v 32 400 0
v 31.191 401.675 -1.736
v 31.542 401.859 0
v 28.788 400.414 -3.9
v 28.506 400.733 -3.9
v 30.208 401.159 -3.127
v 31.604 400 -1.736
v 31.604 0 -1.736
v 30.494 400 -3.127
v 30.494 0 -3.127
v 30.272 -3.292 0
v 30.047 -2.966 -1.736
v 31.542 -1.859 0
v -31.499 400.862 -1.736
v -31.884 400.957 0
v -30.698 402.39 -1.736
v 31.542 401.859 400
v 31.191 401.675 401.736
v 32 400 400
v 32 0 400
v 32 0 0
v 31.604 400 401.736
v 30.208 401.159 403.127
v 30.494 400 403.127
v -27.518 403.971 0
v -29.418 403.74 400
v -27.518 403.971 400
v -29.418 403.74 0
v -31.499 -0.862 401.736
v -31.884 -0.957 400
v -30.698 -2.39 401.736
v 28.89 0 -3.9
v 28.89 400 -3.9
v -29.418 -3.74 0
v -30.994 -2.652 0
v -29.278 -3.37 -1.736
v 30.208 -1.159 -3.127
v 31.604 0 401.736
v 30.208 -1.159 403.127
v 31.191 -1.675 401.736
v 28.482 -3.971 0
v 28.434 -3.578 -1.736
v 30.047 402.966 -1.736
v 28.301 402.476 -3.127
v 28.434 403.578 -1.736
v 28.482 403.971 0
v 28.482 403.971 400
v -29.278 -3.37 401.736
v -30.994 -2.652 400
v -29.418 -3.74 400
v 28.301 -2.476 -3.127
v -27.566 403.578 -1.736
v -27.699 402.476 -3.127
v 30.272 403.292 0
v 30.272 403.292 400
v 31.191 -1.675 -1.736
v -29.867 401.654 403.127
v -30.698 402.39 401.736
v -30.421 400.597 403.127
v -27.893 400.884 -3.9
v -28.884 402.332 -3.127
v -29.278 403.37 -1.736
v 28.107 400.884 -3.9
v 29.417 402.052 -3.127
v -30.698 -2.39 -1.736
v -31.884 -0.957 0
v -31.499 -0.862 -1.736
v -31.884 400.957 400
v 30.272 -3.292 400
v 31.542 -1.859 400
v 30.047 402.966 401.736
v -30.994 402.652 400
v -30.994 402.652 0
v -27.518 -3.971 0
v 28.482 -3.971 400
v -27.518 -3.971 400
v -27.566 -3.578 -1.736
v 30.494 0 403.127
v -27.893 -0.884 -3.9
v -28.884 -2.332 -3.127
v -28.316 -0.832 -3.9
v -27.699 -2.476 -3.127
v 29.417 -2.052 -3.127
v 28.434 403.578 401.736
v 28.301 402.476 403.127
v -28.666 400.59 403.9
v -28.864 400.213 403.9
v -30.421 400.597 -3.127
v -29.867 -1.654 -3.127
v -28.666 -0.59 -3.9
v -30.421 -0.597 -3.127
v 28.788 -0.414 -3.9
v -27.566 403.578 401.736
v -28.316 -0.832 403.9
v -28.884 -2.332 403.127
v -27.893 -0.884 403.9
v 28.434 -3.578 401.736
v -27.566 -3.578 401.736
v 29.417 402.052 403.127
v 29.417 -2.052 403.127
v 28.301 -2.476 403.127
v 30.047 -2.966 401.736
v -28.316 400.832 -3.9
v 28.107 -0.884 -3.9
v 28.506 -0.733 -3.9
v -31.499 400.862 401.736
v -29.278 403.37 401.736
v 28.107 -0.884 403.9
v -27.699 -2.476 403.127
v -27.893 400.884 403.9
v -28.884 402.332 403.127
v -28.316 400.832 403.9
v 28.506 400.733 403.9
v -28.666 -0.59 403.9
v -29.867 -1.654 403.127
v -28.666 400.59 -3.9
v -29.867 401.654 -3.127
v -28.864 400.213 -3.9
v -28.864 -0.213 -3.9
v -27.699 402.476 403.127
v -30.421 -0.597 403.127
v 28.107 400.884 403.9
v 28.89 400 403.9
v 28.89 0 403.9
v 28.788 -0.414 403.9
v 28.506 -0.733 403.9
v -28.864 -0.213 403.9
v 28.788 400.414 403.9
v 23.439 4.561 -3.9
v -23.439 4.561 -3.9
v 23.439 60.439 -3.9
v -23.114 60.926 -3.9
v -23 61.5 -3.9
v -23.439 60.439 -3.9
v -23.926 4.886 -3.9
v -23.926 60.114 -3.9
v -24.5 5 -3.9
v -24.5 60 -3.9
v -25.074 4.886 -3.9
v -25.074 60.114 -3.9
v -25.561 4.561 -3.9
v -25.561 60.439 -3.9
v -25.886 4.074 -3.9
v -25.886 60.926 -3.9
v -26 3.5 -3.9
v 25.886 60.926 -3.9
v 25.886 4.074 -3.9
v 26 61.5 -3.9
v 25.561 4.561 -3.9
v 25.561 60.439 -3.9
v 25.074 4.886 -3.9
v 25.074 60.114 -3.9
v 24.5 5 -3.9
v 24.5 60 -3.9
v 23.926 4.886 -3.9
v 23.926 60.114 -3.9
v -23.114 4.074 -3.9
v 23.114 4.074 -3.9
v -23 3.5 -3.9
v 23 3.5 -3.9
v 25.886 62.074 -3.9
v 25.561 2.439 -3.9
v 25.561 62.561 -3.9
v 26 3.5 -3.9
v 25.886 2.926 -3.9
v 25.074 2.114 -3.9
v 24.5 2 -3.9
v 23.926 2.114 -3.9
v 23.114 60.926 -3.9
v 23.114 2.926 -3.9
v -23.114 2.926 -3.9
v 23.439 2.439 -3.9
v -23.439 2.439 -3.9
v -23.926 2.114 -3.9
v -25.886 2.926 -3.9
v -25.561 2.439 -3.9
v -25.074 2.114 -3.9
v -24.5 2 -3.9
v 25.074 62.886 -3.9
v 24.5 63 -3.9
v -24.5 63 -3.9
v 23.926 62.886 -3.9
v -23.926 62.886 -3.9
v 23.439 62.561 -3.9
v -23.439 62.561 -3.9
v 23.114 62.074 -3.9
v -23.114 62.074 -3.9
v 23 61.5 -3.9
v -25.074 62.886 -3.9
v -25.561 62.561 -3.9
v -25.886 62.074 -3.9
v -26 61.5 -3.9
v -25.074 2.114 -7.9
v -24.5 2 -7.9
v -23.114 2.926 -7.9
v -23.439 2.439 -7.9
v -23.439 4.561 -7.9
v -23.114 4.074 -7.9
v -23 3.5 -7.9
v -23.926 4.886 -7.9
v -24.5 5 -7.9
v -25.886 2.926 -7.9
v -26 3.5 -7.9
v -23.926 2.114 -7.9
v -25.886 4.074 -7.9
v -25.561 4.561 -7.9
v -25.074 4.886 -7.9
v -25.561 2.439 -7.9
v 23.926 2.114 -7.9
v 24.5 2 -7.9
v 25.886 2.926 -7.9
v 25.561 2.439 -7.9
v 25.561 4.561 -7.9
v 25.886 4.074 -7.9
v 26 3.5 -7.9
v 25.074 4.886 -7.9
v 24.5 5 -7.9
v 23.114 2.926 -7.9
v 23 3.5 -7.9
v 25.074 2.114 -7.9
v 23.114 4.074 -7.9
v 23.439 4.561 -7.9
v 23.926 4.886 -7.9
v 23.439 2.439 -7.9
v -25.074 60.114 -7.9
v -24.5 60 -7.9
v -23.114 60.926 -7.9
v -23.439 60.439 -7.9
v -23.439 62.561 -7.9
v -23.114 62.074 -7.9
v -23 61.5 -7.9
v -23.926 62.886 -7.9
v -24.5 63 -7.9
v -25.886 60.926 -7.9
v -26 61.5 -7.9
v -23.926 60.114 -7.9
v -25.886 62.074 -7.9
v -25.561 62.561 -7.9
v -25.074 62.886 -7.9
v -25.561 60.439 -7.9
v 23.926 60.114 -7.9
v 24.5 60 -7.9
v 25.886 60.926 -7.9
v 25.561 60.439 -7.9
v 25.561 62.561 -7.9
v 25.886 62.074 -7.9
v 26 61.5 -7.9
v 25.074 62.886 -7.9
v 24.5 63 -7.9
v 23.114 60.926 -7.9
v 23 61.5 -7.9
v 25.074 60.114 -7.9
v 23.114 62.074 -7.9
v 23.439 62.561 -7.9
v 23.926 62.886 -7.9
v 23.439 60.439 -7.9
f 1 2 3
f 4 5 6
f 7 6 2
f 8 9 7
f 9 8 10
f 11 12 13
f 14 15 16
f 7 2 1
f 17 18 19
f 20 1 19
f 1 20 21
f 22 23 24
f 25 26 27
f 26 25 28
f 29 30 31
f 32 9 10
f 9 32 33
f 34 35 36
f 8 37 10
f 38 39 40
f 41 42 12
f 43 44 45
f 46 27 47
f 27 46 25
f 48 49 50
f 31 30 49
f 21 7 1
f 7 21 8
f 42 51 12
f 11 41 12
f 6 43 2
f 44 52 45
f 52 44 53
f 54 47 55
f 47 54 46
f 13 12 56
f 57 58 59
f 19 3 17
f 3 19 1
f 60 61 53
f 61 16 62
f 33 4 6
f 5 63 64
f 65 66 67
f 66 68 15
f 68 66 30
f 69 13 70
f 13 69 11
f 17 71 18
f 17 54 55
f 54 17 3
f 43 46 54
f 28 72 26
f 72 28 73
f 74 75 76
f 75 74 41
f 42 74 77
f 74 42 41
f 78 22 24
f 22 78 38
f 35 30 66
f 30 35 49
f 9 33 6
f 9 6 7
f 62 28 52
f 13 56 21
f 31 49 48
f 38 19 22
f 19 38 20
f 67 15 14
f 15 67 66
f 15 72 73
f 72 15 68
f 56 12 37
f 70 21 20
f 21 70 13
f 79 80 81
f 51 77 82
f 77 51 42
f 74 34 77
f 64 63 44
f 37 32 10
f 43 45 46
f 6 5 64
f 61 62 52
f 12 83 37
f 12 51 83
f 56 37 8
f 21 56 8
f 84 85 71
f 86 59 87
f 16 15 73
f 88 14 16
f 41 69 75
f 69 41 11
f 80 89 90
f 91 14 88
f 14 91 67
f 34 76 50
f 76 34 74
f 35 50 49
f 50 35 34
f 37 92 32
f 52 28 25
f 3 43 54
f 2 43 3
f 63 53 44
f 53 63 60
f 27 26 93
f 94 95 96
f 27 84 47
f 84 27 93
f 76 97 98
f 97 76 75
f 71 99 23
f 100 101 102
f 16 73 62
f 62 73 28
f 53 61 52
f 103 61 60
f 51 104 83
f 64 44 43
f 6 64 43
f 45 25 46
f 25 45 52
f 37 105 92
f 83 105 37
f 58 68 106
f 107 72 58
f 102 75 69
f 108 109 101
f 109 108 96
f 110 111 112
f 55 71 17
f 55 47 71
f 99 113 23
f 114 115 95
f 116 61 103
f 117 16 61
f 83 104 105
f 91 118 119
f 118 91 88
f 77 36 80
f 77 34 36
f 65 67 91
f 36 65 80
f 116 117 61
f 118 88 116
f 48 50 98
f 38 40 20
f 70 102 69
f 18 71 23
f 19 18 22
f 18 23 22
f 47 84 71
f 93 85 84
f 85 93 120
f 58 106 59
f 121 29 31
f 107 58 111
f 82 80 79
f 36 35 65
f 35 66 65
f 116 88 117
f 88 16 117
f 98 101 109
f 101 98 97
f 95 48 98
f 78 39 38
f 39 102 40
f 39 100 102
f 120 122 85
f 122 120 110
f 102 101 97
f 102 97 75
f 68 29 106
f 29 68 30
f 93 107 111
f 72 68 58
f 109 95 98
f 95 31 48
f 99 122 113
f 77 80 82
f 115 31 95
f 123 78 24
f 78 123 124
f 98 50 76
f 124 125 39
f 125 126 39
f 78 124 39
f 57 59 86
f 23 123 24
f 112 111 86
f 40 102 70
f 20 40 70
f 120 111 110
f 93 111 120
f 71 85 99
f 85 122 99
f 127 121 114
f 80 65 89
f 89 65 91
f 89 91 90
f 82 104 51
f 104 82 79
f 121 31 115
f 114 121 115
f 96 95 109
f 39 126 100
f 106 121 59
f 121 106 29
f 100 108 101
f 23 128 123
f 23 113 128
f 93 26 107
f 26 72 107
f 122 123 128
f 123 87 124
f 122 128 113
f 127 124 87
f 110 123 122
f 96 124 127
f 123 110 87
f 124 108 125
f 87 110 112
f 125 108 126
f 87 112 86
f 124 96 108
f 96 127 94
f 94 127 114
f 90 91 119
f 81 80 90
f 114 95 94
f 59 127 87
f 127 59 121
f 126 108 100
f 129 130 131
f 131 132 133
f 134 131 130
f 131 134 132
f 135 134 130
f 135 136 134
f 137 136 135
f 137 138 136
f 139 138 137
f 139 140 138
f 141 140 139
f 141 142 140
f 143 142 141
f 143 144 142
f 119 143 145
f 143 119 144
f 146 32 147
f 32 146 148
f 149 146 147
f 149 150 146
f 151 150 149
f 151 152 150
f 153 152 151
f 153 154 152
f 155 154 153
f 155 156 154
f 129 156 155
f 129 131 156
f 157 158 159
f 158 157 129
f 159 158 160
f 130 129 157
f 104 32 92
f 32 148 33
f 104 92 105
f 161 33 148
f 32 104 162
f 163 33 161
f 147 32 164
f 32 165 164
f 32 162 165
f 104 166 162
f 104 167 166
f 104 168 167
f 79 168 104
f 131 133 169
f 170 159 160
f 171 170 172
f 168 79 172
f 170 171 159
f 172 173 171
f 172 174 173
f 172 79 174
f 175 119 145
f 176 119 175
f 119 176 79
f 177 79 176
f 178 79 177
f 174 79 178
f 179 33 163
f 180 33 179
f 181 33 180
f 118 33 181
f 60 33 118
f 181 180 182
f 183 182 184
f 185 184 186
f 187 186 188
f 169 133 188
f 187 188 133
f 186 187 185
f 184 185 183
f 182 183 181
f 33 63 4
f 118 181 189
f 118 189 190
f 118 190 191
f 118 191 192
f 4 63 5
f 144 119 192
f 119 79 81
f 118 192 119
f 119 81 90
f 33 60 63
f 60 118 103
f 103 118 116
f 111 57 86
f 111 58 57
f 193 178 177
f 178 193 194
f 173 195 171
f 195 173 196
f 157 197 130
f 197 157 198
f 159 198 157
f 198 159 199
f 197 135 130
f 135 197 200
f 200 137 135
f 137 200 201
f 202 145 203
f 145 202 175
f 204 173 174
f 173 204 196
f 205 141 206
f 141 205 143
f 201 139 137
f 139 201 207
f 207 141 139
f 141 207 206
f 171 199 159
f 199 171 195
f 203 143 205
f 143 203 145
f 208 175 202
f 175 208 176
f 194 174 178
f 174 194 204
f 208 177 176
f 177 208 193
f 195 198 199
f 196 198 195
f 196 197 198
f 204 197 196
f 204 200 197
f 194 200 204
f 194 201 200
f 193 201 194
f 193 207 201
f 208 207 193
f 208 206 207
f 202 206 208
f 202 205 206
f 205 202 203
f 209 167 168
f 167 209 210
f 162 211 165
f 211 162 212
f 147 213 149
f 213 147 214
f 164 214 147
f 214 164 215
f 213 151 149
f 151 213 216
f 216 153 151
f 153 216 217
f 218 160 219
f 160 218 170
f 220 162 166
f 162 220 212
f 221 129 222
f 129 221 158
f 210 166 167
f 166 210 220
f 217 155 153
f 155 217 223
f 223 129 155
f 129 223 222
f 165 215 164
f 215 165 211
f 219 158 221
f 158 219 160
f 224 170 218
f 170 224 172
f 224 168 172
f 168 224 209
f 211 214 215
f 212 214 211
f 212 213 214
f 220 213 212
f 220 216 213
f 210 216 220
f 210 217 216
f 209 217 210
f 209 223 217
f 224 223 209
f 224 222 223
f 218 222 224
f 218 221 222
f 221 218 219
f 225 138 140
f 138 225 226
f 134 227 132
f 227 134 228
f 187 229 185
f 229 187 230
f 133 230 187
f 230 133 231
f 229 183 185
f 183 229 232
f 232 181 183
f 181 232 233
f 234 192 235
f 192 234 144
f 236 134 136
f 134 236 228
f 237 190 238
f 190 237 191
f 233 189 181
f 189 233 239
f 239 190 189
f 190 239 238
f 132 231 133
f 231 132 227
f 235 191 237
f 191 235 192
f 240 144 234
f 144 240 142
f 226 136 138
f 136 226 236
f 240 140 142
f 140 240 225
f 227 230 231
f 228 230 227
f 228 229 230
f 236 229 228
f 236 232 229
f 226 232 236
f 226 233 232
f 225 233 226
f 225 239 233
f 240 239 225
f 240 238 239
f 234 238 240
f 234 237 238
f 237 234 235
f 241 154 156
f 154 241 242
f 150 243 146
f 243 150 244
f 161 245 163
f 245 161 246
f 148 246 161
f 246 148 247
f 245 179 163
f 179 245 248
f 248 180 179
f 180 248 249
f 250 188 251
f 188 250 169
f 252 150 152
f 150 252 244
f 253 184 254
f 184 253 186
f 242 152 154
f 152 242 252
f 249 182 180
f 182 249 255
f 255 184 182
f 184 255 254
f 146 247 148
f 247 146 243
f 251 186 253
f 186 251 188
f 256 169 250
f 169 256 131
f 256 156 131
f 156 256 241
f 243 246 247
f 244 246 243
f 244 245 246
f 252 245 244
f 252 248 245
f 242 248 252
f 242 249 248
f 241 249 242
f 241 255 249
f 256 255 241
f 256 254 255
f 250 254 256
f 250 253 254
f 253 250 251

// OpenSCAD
//use <../RPi4board-modded.scad>

// Nagative for raspberry pi 4 / 5 pocket
rpi_pcb_w = 56;
rpi_pcb_h = 85;
rpi_pcb_h2 = 65;

module raspberyPiWithReses()
{
    translate([-rpi_pcb_w/2,0,0])
    union()
    {
        // Board
        color("gray", 0.5) cube([rpi_pcb_w, rpi_pcb_h, 20]);
        
        // reses for GPIOS / 
        // reses for the ports (USBs and Eternet)
        color("red", 0.4) {
            translate([2,2,20])
            minkowski(){
                cube([rpi_pcb_w-4, rpi_pcb_h-20, 50]);
                sphere(2);
            }
        }
       // reses for Hat
        color("red", 0.1) {
            translate([0,rpi_pcb_h,0])
            minkowski(){
                cube([rpi_pcb_w, 100, 20]);
            }
        }

        
        // reses for the 2x HDMIs and USB-C 
        color("red", 0.4) 
        {
            translate([4,4,4])
                minkowski(){
                    cube ([100, 58, 6]) ;
                    sphere(4);
                }
        }
        // reses for the SD
        color("red",0.1) 
        {
            translate([rpi_pcb_w/2,-10,1])
            minkowski(){
                    cube([15, 20,5], true);
                    sphere(4);
                }
       
        }
    }
}


module raspberyPiPocket(margin = 4)
{
    translate([-rpi_pcb_w/2,0,0])
    union()
    {
        // Board
        color("gray", 1) cube([rpi_pcb_w, rpi_pcb_h, 20]);
        color("red", 0.4)
        {
            translate([0,-100,0]);
            minkowski()
            {
                    
                cube([rpi_pcb_w, 400, 400]);
                sphere(margin);
            }
            
       
        }       
    }
}

module raspberyPiHoles(d=3, h=8)
{
    sx = 3.5;
    sy = 3.5;
    
    x = 49;
    y = 58;
    translate([-rpi_pcb_w/2,0,0.1])
    union()
    {
        translate([sx,sy,-h/2])
            cylinder(h, d=d, center=true, $fn=16);
        translate([sx+x,sy,-h/2])
            cylinder(h, d=d, center=true, $fn=16);
        translate([sx,sy+y,-h/2])
            cylinder(h, d=d, center=true, $fn=16);
        translate([sx+x,sy+y,-h/2])
            cylinder(h, d=d, center=true, $fn=16);
    }
}

//raspberyPiWithReses();
raspberyPiPocket();
raspberyPiHoles();
